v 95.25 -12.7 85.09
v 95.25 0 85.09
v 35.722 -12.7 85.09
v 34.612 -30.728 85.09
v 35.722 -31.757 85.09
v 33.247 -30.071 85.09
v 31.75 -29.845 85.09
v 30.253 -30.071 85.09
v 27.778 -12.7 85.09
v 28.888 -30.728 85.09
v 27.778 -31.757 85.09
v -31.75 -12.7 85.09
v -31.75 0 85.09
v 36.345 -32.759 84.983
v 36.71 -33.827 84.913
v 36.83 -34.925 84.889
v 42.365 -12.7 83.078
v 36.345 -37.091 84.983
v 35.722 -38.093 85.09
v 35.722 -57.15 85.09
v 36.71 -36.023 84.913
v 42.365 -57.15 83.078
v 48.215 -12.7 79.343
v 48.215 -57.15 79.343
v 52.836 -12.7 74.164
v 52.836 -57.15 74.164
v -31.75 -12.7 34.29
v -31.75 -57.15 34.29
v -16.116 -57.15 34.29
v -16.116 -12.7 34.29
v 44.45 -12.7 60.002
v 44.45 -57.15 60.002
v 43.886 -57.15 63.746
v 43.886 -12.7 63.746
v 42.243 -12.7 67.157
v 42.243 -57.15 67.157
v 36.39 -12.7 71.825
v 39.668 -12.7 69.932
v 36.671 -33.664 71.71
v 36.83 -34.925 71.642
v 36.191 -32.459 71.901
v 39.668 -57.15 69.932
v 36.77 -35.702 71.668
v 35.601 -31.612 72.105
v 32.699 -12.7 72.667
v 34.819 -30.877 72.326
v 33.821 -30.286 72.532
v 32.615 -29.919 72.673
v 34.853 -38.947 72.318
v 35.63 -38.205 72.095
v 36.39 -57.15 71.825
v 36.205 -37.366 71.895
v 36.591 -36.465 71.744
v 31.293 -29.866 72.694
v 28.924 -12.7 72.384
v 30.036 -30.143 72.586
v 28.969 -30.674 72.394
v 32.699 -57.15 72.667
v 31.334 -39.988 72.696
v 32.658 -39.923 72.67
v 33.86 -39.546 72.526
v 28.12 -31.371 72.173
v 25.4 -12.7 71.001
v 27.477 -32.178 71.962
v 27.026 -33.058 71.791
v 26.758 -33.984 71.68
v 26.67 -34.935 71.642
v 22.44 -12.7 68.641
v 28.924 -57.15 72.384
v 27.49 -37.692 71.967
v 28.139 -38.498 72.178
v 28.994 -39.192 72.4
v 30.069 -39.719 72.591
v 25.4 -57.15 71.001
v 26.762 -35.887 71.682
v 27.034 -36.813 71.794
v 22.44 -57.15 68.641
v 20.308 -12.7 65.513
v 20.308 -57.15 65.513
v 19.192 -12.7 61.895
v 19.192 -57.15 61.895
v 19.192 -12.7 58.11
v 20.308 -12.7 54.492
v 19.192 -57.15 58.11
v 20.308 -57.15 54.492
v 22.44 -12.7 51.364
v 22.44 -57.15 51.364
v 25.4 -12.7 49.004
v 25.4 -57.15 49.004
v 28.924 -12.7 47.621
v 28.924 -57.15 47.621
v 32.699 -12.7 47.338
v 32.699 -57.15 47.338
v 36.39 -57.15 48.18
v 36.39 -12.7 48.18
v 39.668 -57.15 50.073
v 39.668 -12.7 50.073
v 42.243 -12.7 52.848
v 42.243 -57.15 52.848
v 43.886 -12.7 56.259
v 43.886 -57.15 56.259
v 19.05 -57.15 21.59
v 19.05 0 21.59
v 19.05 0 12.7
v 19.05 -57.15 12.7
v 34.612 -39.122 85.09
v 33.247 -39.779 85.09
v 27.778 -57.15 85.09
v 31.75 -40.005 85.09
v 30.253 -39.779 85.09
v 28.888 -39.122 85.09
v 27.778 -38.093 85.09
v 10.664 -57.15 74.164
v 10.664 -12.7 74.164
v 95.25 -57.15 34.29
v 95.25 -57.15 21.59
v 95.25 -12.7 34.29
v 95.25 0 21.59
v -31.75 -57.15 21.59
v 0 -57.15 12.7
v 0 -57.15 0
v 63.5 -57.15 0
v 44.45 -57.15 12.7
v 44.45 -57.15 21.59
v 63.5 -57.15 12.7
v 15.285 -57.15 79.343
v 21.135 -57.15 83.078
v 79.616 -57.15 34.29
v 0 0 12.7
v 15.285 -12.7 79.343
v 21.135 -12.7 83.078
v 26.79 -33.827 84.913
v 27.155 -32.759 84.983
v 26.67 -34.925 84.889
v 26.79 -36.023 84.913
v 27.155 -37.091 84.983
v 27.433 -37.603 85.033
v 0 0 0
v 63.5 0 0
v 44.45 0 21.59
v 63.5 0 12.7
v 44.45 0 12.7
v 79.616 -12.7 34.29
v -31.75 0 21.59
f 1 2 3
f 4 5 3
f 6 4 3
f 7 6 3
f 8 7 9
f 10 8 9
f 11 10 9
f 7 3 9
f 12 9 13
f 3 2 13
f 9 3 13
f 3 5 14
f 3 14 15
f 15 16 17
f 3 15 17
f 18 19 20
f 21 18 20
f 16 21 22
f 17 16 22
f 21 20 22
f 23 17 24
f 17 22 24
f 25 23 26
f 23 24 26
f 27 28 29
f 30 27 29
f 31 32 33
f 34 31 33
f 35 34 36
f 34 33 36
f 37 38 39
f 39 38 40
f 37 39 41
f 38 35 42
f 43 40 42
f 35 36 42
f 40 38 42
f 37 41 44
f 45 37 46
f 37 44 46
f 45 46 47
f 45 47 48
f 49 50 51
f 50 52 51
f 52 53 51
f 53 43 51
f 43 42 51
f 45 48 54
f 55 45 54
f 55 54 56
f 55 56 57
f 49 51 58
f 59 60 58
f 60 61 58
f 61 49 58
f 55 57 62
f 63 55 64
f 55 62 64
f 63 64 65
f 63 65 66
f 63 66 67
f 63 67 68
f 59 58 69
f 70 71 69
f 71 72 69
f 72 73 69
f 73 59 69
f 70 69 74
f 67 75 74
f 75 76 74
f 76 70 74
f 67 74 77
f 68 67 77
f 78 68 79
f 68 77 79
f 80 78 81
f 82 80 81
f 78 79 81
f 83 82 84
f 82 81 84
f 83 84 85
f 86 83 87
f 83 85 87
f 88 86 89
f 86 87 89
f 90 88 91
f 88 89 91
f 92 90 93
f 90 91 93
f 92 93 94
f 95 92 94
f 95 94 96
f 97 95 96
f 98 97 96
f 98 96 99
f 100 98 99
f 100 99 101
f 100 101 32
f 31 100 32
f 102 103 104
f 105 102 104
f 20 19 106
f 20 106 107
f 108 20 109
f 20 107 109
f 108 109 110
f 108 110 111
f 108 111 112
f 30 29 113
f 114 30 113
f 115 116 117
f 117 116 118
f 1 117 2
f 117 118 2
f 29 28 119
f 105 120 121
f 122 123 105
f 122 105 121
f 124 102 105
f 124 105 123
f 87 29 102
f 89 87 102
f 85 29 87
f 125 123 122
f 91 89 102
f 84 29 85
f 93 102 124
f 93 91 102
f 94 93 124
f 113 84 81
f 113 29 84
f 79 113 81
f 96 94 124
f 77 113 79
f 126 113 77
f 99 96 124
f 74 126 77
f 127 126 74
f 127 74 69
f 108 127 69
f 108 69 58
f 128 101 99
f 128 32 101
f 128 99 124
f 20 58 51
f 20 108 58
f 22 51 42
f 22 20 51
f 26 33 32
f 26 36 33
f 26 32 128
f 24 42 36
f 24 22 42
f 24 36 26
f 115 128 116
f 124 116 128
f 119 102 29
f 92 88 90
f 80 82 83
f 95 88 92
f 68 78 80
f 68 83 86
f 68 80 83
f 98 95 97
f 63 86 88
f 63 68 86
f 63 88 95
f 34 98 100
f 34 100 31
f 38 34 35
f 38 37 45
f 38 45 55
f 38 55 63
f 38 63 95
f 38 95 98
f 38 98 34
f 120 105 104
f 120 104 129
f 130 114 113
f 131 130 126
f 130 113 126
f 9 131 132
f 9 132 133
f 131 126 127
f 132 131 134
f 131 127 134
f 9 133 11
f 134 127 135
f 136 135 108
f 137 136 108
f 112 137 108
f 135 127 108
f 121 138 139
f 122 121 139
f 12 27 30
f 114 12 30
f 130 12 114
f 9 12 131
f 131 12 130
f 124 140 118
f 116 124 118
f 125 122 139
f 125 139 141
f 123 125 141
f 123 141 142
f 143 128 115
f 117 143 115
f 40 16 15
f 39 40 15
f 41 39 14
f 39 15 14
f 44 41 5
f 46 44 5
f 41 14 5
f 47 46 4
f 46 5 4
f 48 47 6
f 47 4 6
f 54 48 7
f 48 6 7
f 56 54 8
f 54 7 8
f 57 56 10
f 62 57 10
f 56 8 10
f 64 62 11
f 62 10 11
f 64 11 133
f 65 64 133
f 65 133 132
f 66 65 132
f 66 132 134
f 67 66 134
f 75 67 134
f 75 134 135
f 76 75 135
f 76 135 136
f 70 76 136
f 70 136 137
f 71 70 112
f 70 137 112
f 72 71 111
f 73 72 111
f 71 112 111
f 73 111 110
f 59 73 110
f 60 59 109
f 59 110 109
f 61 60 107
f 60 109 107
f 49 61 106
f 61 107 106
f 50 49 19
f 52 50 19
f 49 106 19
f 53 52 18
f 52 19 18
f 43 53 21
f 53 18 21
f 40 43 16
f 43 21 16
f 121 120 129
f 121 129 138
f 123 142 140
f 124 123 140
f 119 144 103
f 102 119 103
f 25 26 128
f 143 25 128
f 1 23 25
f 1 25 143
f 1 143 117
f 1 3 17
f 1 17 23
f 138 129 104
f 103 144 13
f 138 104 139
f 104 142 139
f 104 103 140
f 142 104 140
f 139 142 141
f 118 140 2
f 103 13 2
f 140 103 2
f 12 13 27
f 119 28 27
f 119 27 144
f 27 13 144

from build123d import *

# Parameters (mm, degrees)
F1_DEPTH = 57.15
F2_R     = 12.7
F3_DEPTH = 44.45
F4_R     = 5.08
F5_DEPTH = 25.4


with BuildPart() as f1:
    # F0 (on Front) → F1 (new body)
    with BuildSketch(Plane.XZ):
        with BuildLine():
            Line((0, 12.7), (0, 0))
            Line((0, 0), (63.5, 0))
            Line((63.5, 0), (63.5, 12.7))
            Line((63.5, 12.7), (44.45, 12.7))
            Line((44.45, 12.7), (44.45, 21.59))
            Line((44.45, 21.59), (95.25, 21.59))
            Line((95.25, 21.59), (95.25, 34.29))
            Line((95.25, 34.29), (79.375, 34.29))
            Line((79.375, 34.29), (52.843426, 73.840173))
            ThreePointArc((52.843426, 73.840173), (43.702941, 82.101765), (31.75, 85.09))
            ThreePointArc((31.75, 85.09), (19.797059, 82.101765), (10.656574, 73.840173))
            Line((10.656574, 73.840173), (-15.875, 34.29))
            Line((-15.875, 34.29), (-31.75, 34.29))
            Line((-31.75, 34.29), (-31.75, 21.59))
            Line((-31.75, 21.59), (19.05, 21.59))
            Line((19.05, 21.59), (19.05, 12.7))
            Line((19.05, 12.7), (0, 12.7))
        make_face()
        with BuildLine():
            Line((-31.75, 85.09), (-31.75, 34.29))
            Line((-31.75, 34.29), (-15.875, 34.29))
            Line((-15.875, 34.29), (10.656574, 73.840173))
            ThreePointArc((10.656574, 73.840173), (19.797059, 82.101765), (31.75, 85.09))
            Line((31.75, 85.09), (-31.75, 85.09))
        make_face()
        with BuildLine():
            Line((79.375, 34.29), (95.25, 34.29))
            Line((95.25, 34.29), (95.25, 85.09))
            Line((95.25, 85.09), (31.75, 85.09))
            ThreePointArc((31.75, 85.09), (43.702941, 82.101765), (52.843426, 73.840173))
            Line((52.843426, 73.840173), (79.375, 34.29))
        make_face()
    extrude(amount=F1_DEPTH)

    # F2 (on face) → F3 (cut)
    with BuildSketch(Plane.XZ.offset(57.15)):
        with BuildLine():
            Line((-31.75, 85.09), (-31.75, 34.29))
            Line((-31.75, 34.29), (-16.115654, 34.29))
            Line((-16.115654, 34.29), (10.664181, 74.163921))
            ThreePointArc((10.664181, 74.163921), (18.082063, 81.411466), (27.778468, 85.09))
            Line((27.778468, 85.09), (-31.75, 85.09))
        make_face()
        with BuildLine():
            Line((95.25, 85.09), (35.721532, 85.09))
            ThreePointArc((35.721532, 85.09), (45.417937, 81.411466), (52.835819, 74.163921))
            Line((52.835819, 74.163921), (79.615654, 34.29))
            Line((79.615654, 34.29), (95.25, 34.29))
            Line((95.25, 34.29), (95.25, 85.09))
        make_face()
        with BuildLine():
            ThreePointArc((35.721532, 85.09), (31.75, 85.402415), (27.778468, 85.09))
            Line((27.778468, 85.09), (35.721532, 85.09))
        make_face()
        with Locations((31.75, 60.002415)):
            Circle(F2_R)
    extrude(amount=-F3_DEPTH, mode=Mode.SUBTRACT)

    # F4 (on face) → F5 (cut)
    with BuildSketch(Plane.XY.offset(85.09)):
        with Locations((31.75, -34.925)):
            Circle(F4_R)
    extrude(amount=-F5_DEPTH, mode=Mode.SUBTRACT)


solid = f1.part
